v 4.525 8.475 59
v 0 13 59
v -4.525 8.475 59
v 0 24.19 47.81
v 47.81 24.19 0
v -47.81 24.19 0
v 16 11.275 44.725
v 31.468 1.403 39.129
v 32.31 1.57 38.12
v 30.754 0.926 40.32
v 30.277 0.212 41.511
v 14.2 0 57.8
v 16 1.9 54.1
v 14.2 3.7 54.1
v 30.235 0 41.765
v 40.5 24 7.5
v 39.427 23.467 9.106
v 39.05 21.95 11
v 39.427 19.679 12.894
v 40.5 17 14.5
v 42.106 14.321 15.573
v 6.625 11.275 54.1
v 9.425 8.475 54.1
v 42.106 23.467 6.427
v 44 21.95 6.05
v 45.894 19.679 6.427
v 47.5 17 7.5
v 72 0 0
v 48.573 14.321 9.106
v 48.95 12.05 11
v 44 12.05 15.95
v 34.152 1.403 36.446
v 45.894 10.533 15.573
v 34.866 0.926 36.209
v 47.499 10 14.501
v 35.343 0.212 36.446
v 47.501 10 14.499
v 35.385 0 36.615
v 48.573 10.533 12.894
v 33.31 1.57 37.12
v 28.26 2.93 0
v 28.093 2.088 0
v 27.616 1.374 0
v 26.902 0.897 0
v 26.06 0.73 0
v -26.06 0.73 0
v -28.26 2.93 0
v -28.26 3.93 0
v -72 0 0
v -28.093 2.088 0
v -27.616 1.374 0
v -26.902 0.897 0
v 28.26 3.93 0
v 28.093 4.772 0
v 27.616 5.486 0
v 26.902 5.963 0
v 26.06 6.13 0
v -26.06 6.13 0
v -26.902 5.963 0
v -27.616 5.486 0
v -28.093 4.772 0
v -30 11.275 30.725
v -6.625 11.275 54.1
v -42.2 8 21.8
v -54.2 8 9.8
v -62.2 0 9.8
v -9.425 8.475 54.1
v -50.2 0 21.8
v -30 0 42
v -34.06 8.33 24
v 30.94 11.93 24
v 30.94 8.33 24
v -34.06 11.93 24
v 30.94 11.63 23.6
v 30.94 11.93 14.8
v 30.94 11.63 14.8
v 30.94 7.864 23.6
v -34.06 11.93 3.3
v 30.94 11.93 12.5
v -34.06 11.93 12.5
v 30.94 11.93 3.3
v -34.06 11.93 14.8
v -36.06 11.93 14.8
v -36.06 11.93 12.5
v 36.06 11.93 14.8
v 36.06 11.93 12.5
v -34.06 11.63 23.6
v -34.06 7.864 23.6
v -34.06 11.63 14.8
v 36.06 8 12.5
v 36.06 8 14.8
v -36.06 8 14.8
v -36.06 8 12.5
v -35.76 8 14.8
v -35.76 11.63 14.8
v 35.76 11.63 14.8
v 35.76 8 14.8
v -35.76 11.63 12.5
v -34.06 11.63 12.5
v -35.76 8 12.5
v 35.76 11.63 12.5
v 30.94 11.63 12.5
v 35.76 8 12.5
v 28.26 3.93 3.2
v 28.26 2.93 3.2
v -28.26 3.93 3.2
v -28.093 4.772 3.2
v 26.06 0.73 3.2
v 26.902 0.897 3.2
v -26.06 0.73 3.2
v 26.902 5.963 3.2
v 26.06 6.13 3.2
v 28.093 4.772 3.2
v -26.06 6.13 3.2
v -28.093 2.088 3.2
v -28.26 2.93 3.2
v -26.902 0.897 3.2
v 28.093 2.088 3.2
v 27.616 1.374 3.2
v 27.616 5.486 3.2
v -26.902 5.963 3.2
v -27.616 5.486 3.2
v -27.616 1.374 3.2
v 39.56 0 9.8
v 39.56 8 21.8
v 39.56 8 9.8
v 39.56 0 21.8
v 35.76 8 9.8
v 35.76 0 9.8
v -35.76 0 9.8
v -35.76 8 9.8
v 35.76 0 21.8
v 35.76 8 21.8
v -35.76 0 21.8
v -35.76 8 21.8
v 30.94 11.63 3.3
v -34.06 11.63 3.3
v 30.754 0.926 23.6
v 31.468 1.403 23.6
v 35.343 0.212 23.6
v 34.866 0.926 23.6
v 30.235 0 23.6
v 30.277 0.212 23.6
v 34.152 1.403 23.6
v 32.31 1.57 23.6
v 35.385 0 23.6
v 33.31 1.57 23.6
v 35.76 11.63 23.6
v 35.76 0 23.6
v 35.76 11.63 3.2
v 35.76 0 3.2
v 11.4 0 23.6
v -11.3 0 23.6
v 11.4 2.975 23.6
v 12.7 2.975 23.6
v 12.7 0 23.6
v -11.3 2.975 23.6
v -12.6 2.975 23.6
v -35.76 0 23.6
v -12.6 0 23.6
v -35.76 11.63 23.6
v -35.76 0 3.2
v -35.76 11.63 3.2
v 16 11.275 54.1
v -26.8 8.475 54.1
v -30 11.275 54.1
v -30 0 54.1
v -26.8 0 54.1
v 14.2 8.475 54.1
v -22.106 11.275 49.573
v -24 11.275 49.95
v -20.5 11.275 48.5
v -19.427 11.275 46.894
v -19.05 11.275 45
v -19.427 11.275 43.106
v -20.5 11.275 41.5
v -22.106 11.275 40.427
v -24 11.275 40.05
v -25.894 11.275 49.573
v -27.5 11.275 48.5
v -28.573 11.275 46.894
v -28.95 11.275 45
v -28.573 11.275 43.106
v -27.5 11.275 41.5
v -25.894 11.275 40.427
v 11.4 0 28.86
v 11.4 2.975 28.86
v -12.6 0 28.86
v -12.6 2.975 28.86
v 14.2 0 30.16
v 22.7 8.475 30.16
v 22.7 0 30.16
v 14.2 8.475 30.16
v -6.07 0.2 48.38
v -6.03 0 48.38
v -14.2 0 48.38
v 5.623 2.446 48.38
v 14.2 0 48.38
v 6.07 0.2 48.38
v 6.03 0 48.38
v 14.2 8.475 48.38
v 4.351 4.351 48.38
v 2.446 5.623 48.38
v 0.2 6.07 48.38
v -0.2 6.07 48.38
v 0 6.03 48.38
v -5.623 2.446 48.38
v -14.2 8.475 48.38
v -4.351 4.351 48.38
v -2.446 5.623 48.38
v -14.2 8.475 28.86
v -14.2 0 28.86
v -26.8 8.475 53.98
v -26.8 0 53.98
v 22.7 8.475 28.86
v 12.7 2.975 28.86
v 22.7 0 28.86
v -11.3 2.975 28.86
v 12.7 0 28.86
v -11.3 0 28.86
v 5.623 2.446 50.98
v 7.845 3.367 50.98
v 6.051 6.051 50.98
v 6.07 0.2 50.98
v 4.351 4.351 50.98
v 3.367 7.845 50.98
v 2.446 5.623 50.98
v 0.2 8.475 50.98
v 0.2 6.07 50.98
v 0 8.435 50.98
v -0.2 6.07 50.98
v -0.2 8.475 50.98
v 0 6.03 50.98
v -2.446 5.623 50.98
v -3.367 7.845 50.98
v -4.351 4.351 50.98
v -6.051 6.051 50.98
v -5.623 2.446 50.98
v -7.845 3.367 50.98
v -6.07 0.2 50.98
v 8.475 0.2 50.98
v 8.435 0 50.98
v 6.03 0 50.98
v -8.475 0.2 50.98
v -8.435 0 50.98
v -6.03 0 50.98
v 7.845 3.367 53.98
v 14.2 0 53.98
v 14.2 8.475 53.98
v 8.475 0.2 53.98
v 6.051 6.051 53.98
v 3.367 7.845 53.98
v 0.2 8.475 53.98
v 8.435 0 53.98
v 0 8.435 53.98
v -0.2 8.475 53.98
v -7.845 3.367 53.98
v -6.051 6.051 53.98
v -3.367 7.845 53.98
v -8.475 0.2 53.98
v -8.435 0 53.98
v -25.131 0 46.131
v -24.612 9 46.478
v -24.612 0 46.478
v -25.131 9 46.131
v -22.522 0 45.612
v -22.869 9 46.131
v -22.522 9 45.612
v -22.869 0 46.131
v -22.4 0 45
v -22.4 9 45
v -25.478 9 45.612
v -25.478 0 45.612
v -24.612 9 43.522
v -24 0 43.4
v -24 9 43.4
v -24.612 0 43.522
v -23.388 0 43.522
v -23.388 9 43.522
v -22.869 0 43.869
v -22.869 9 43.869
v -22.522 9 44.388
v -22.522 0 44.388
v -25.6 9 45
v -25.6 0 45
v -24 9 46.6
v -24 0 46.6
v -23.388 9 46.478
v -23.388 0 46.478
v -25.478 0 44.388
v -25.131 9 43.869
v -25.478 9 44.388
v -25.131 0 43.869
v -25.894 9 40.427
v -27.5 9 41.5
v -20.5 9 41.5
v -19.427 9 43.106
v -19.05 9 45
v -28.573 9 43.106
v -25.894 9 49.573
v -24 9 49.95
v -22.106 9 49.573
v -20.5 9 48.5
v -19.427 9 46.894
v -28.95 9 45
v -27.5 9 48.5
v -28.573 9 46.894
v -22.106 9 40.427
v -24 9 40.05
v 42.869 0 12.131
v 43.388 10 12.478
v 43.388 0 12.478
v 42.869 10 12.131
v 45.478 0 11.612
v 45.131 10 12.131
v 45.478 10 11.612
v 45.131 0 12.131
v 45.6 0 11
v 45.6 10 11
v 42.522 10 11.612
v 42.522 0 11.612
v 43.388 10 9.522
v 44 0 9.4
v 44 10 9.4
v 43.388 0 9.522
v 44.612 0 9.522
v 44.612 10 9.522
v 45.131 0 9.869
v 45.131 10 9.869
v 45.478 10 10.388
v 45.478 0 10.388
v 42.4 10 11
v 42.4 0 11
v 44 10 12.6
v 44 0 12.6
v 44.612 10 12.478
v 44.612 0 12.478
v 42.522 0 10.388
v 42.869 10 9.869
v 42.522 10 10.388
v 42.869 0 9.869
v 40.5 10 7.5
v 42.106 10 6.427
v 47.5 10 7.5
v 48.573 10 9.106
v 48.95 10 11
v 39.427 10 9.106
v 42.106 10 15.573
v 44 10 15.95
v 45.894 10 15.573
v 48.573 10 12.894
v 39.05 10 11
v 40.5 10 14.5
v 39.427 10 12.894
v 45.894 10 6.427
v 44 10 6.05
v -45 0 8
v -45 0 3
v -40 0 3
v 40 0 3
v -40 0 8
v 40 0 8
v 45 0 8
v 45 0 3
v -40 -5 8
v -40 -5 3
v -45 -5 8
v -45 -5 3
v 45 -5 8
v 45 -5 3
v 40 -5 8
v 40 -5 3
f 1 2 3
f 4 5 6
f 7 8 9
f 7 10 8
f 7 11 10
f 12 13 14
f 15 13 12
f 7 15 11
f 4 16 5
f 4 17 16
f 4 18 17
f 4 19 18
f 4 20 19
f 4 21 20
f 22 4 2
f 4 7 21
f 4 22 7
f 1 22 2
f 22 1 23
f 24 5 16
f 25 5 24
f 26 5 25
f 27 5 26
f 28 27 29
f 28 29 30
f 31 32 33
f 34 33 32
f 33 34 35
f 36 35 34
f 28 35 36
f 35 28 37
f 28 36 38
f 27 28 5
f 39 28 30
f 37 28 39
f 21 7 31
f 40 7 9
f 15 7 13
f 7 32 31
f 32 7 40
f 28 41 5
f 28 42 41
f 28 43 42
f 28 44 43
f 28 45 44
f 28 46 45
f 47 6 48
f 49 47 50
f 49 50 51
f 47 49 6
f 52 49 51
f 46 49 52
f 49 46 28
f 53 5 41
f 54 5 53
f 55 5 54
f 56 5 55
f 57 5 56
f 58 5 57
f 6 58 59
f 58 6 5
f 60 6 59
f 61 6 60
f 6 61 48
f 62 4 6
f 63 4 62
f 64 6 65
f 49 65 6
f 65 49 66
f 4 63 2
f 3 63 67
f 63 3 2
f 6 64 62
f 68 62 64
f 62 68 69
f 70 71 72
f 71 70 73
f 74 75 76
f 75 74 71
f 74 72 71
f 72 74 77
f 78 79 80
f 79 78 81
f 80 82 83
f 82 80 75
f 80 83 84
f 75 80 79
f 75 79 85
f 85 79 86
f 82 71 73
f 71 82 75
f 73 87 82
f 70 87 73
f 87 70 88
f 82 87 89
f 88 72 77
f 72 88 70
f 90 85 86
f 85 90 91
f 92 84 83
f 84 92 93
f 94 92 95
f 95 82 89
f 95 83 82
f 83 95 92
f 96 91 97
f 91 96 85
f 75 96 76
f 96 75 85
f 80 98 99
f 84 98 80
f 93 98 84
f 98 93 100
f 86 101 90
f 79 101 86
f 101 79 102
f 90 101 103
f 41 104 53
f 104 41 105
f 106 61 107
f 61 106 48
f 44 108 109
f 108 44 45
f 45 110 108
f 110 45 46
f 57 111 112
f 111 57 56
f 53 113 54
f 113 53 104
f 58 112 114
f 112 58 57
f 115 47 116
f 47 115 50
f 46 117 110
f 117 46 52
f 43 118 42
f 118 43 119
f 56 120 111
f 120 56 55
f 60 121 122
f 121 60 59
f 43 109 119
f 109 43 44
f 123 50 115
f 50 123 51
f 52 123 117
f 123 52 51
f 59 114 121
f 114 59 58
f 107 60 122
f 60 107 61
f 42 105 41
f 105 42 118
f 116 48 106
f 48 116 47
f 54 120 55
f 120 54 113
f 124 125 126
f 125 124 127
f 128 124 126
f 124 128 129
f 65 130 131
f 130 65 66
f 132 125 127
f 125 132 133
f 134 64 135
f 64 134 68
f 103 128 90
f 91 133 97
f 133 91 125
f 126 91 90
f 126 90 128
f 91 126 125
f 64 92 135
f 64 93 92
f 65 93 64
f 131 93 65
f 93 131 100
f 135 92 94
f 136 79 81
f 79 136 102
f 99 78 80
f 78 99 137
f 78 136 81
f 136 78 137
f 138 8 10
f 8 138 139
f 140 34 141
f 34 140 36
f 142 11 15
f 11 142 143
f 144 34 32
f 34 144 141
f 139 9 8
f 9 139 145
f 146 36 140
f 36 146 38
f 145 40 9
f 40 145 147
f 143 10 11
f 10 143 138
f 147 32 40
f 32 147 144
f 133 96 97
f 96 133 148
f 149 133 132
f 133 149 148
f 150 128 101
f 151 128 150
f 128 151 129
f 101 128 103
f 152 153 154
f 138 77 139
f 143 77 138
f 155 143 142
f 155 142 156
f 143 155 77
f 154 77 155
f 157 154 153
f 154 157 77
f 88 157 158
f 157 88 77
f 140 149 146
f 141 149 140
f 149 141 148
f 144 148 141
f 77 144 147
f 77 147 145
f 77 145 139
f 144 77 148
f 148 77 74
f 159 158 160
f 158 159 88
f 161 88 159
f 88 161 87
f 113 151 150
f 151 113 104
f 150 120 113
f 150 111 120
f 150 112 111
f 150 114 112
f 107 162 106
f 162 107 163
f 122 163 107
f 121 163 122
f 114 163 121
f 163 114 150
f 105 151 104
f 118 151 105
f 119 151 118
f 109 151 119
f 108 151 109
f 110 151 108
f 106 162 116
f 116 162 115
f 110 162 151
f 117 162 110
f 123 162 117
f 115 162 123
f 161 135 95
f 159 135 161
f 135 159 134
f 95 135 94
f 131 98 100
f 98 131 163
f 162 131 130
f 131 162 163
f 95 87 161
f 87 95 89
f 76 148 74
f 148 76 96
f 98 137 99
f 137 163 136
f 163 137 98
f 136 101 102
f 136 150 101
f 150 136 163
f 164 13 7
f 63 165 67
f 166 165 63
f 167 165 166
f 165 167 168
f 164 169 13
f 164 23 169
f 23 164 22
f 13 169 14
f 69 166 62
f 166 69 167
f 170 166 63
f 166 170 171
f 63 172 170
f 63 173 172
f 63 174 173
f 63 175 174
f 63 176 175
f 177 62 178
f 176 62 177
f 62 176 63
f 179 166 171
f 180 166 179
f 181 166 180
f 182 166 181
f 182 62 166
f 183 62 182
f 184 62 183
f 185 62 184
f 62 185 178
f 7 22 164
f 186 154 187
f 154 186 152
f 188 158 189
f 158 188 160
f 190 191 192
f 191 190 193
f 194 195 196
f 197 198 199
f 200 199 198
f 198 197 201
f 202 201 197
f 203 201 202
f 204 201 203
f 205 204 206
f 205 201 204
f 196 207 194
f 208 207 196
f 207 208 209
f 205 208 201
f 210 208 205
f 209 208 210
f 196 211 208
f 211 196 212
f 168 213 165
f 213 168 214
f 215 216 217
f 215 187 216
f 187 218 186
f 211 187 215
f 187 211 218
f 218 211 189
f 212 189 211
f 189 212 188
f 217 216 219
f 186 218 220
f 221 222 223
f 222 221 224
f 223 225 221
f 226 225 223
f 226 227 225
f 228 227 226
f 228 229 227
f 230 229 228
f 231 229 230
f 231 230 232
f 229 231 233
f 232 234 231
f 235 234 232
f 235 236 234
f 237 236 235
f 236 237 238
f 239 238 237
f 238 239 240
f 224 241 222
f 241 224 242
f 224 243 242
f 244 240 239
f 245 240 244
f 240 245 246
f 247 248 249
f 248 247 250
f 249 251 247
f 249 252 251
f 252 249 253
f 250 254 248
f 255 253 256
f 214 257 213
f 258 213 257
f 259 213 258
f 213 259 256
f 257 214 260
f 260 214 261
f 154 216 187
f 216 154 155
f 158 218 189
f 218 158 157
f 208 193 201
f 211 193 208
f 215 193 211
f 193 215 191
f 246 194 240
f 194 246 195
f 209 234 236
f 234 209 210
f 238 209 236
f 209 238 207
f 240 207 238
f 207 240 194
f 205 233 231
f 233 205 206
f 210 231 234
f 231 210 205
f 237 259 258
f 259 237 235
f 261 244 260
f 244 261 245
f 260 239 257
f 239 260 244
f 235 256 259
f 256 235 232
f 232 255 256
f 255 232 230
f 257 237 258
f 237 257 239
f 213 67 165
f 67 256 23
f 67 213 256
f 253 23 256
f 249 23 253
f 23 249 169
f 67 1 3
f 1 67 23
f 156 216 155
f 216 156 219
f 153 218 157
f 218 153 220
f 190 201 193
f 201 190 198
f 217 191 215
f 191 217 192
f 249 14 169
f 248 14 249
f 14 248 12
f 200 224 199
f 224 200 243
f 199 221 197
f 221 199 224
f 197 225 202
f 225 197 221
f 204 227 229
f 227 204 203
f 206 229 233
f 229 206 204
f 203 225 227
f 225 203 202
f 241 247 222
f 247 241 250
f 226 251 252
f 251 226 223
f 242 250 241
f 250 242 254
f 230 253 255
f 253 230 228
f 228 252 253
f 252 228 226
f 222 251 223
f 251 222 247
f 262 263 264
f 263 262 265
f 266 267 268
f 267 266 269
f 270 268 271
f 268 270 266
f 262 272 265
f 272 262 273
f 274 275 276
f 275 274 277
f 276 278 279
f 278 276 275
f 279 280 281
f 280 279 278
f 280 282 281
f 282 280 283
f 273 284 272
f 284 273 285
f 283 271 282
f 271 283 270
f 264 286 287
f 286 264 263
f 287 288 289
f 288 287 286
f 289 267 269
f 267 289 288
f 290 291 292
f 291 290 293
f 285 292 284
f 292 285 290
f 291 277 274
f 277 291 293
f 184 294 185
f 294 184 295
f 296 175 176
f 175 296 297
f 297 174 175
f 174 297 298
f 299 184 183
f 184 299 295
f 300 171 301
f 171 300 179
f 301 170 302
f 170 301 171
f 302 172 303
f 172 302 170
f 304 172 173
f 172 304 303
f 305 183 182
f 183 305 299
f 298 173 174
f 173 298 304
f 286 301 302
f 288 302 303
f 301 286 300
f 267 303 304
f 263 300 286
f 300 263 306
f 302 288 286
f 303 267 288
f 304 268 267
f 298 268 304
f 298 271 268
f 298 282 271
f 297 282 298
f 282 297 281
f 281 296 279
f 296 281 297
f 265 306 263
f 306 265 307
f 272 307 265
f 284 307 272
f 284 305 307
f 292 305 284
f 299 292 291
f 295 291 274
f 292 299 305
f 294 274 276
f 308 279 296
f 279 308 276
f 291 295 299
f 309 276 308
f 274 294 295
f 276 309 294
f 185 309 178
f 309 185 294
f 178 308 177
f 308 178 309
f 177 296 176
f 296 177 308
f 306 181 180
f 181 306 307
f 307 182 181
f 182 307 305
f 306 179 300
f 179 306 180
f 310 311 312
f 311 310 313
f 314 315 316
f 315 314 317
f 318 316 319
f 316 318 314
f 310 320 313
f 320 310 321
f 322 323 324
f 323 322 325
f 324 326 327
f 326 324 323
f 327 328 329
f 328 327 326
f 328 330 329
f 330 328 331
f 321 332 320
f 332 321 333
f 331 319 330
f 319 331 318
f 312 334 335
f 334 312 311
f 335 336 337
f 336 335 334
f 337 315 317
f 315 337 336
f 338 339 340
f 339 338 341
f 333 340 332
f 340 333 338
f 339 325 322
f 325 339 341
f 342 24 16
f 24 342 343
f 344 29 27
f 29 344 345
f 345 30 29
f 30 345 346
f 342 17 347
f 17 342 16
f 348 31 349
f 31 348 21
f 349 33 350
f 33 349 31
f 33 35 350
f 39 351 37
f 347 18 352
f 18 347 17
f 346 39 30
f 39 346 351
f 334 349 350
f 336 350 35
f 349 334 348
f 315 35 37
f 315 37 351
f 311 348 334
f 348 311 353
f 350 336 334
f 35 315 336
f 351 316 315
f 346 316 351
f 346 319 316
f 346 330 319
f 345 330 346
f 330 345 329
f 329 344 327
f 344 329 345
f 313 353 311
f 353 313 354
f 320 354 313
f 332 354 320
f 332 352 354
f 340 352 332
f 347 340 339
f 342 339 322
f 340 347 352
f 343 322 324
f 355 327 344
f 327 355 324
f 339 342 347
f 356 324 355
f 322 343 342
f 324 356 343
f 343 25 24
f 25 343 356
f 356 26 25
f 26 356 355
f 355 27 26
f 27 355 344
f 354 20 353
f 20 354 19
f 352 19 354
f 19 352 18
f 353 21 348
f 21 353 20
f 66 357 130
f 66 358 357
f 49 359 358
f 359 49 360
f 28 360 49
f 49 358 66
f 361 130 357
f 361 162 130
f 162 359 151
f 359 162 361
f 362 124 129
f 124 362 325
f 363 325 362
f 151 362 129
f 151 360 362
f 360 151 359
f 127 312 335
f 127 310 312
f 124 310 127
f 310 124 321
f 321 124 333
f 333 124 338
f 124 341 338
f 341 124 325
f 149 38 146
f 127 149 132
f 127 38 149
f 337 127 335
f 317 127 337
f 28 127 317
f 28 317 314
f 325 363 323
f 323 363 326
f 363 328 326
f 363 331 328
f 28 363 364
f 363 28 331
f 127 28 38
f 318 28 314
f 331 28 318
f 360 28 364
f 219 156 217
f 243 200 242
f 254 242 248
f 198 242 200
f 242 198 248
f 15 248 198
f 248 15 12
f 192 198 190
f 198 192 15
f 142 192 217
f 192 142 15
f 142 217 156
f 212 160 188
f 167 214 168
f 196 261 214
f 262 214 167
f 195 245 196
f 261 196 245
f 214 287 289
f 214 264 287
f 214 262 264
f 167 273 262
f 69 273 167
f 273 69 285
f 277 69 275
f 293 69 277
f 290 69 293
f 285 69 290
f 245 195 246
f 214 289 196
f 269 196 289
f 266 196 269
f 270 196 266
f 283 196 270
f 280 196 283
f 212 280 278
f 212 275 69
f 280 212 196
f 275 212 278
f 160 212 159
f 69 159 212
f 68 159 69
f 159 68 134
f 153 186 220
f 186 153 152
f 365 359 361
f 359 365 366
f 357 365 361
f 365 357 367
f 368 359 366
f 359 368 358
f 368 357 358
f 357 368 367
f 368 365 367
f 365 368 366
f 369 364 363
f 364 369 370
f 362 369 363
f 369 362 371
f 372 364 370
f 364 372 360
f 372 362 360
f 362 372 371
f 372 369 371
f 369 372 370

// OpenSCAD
// file: ../3d-iot-component-models/m3.scad
// m3 bolt negative space

$fn=16;

shaft_radius = 2.9/2;
head_radius = 5.9/2;

m3_bolt_space();

module m3_bolt_space(head_extra=2, shaft_extra=.15, head_height=40, length=40) {
    cylinder(h=head_height, r=head_radius + head_extra);

    translate([0, 0, -length])
        cylinder(h=length, r=shaft_radius + shaft_extra);
}
// file: ../3d-iot-component-models/toggle-switch-with-cover.scad
// A toggle switch ordered from https://www.sparkfun.com/products/11310

$fn = 16;

length = 28;
width = 16.55;
height = 19.12;

toggle_switch_with_cover();

module base() {
    cube([length, width, height]);
}

module prongs() {
    translate([1.5, 5.5, -10.6]) cube([.9, 6.6, 10.6]);
    translate([25.5, 5.5, -10.6]) cube([.9, 6.6, 10.6]);
    translate([-8.5, 0, 0]) cube([8.5, width/2, .9]);
}

module shaft() {
    translate([length/2, width/2, height]) cylinder(h = 13, r = 11.74 / 2);
    translate([length/2, width/2, height + 3]) cylinder(h = 6, r = 16.55 / 2);
}

module plate() {
    translate([0, 0, height + 6]) cube([40.6, 17, .9]);
}

module toggle() {
    translate([length/2, width/2, height + 9]) rotate([0, -15, 0]) {
        cylinder(h = 15, r = 7.22/2);    
    }
}

module cover() {
    color("red") translate([0, 0, height + 6.82])
        cube([40.6, width, 43.9 - 17.56]);
}

module toggle_switch_with_cover() {
    translate([0, 0, -height - .82 - 6]) 
        union() {
            base();
            color("silver") prongs();
            color("black") shaft();
            color("silver") plate();
            color("red") toggle();
            color("red") cover();
        }
}
// file: ../3d-iot-component-models/arduino-yun-mini.scad
// Arduino Yun Mini 3D model for planning

$fn = 16;

length = 71.12;
width = 22.86;
height = 1.3;
header_length = 64;
header_height = 9.2;

arduino_yun_mini();

module board() {
    cube([length, width, height]);
}

module usb_power() {
    translate([-102, (width - 15) / 2, height - 4]) cube([105.5 + length, 15, 3 + 8]);
}

module header(y = 0, z = 0) {
    translate([2, y, z]) cube([header_length, 2.6, header_height]);
}

module leds() {
    translate([header_length, 0, height]) cube([2, width/2, 1]);
}

module button(y = 0) {
    translate([length - 2.75, y, height]) cylinder(r=2.2, h=100);    
}

module bottom_button(bx = length - 2, by = 7.5) {
    translate([bx, by, -100]) cylinder(r=2.2, h=100); 
}

module bottom_slot(y = 0) {
    hull() {
        translate([length - 10, y, -100]) cylinder(r=2.2, h=100); 
        translate([10, y, -100]) cylinder(r=2.2, h=100); 
    }
}

module hole(x = 0, y = 0) {
    translate([x, y, -9]) cylinder(h = 10 + height, r = 2.5/2);
}

module arduino_yun_mini() {
    difference() {
        color("green") board();
        union() {
            hole(x = 2.5, y = width - 4);
            hole(x = length - 2, y = 2);
        }
    }

    color("magenta") usb_power();
    color("red") leds();
    color("blue") button(y = 6.5);
    color("blue") button(y = 10.3);
    color("violet") bottom_button(y = 10.3);
    color("orange") bottom_slot(y = 8);
    color("orange") bottom_slot(y = width - 8);
    color("black") hull() {
        header(z = height, y = 0);
        translate([0, 0, 2.6]) rotate([-90, 0, 0]) {
            header(z = 0, y = 0);
        }
    }
    color("black") hull() {
        header(z = height, y = width - 2.6);
        translate([0, width - 2.6, 0]) rotate([90, 0, 0]) {
            header(z = 0, y = 0);
        }
    }
    color("silver") header(z = -9.2, y = 0);
    color("silver") header(z = -9.2, y = width - 2.6);
}
// main file
// WIFI Switch 3D Model, Arduino Yun version

$fn = 8;

cube_side = 72;
cube_tip_clip = 59;
side_clip = cube_tip_clip*.41;

yun_length = 71.12;
yun_width = 22.86;
yun_height = 1.3 + 2*64;
yun_x = -yun_length/2;
yun_y = -yun_width/2;
yun_z = 13;
yun_skin = .2;

toggle_length = 28;
toggle_width = 16.55;
toggle_z = 55;

tip_surround_width = 3;
tip_width = toggle_width + 2*tip_surround_width;
tip_length = 46;

push_button();

module push_button() {
    // Uncomment one of the following 3 lines at a time
//    body();
    left_half();
//    right_half();
    
//    yun_moved();
//    toggle_moved();
}

module left_half() {
    difference() {
        body();
        union() {
            translate([-2*cube_side, -4*cube_side, -1])
                cube([cube_side*4, cube_side*4, cube_side*2]);        
            yun_hole();
        }
    }
    color("pink") spike(x=-45);
    color("pink") spike(x=40);
}

module spike(x=0, skin=0) {
    translate([x - skin, -5 - skin, 3 - skin])
        cube([5 + 2*skin, 10 + 2*skin, 5 + 2*skin]);
}

module right_half() {
    difference() {
        body();
        union() {
            translate([-2*cube_side, 0, -1])
                cube([cube_side*4, cube_side*4, cube_side*2]);
            spike(x=-45, skin=.1);
            spike(x=40, skin=.1);
        }
    }
}

module body() {
    difference() {
        union() {
            color("purple") difference() {
                box();
                yun_hole();
            }
            color("orange") tip();
        }
        union() {
	        toggle_moved(dx=yun_skin, dy=yun_skin, dz=yun_skin);
	        toggle_moved(dx=yun_skin, dy=yun_skin, dz=-yun_skin);
	        toggle_moved(dx=yun_skin, dy=-yun_skin, dz=yun_skin);
	        toggle_moved(dx=yun_skin, dy=-yun_skin, dz=-yun_skin);
	        toggle_moved(dx=-yun_skin, dy=yun_skin, dz=yun_skin);
	        toggle_moved(dx=-yun_skin, dy=yun_skin, dz=-yun_skin);
	        toggle_moved(dx=-yun_skin, dy=-yun_skin, dz=yun_skin);
	        toggle_moved(dx=-yun_skin, dy=-yun_skin, dz=-yun_skin);
            translate([-24, -9, 45]) rotate([90, 0, 0]) {
                bolt();
            }
            translate([-24, 9, 45]) rotate([-90, 0, 0]) {
                bolt();
            }
            translate([44, -10, 11]) rotate([90, 0, 0]) {
                bolt();
            }
            translate([44, 10, 11]) rotate([-90, 0, 0]) {
                bolt();
            }
	    }
    }
}

module yun_moved() {
    translate([yun_x, yun_y, yun_z])
        yun();
}

module yun_hole() {
    translate([yun_x - yun_skin, yun_y - yun_skin, yun_z - 9.6 - yun_skin])
        cube([yun_length + 2*yun_skin, yun_width + 2*yun_skin, 9.2*2 + 1.6 + 2*yun_skin]);
    minkowski() {
        yun_moved();
        cube(side=yun_skin, center=true);
    }
}

module yun_holder() {
    translate([yun_x, yun_y, yun_z])
        yun();    
}

module tip() {
    translate([-30, -tip_width/2, yun_z + 8])
        difference() {
            union() {
                cube([tip_length, tip_width, cube_tip_clip + .1 - 26]);
                translate([10, 0, 0])
                    cube([tip_length, tip_width, 10]);
            }
            translate([0, 0, toggle_z])
                cube([tip_length/2, tip_width, 20]);
        }
}

module poly() {
    difference() {
        polyhedron(
            points=[[cube_side,0,0],
                [0,-cube_side,0],
                [-cube_side,0,0],
                [0,cube_side,0],
                [0,0,cube_side]],
            faces=[[0,1,4],[1,2,4],[2,3,4],[3,0,4],[1,0,3],[2,1,3]]);
        union() {
            translate([-2*cube_side, -2*cube_side, cube_tip_clip])
                cube([cube_side*4, cube_side*4, cube_side]);
            translate([-2*cube_side, -side_clip - 4*cube_side, -1])
                cube([cube_side*4, cube_side*4, cube_side]);
            translate([-2*cube_side, side_clip, -1])
                cube([cube_side*4, cube_side*4, cube_side]);            
        }
    }
}

module box() {
    difference() {
        poly();
        yun_holder();
    }
}

module toggle_moved(dx=0, dy=0, dz=0) {
    rotate([0, 0, 180]) {
        translate([-toggle_length/2 + dx, -toggle_width/2 + dy, toggle_z + dz])
            toggle();
    }
}

module yun() {
    include <../3d-iot-component-models/arduino-yun-mini.scad>
}

module toggle() {
    include <../3d-iot-component-models/toggle-switch-with-cover.scad>
}

module bolt() {
    include <../3d-iot-component-models/m3.scad>
}
